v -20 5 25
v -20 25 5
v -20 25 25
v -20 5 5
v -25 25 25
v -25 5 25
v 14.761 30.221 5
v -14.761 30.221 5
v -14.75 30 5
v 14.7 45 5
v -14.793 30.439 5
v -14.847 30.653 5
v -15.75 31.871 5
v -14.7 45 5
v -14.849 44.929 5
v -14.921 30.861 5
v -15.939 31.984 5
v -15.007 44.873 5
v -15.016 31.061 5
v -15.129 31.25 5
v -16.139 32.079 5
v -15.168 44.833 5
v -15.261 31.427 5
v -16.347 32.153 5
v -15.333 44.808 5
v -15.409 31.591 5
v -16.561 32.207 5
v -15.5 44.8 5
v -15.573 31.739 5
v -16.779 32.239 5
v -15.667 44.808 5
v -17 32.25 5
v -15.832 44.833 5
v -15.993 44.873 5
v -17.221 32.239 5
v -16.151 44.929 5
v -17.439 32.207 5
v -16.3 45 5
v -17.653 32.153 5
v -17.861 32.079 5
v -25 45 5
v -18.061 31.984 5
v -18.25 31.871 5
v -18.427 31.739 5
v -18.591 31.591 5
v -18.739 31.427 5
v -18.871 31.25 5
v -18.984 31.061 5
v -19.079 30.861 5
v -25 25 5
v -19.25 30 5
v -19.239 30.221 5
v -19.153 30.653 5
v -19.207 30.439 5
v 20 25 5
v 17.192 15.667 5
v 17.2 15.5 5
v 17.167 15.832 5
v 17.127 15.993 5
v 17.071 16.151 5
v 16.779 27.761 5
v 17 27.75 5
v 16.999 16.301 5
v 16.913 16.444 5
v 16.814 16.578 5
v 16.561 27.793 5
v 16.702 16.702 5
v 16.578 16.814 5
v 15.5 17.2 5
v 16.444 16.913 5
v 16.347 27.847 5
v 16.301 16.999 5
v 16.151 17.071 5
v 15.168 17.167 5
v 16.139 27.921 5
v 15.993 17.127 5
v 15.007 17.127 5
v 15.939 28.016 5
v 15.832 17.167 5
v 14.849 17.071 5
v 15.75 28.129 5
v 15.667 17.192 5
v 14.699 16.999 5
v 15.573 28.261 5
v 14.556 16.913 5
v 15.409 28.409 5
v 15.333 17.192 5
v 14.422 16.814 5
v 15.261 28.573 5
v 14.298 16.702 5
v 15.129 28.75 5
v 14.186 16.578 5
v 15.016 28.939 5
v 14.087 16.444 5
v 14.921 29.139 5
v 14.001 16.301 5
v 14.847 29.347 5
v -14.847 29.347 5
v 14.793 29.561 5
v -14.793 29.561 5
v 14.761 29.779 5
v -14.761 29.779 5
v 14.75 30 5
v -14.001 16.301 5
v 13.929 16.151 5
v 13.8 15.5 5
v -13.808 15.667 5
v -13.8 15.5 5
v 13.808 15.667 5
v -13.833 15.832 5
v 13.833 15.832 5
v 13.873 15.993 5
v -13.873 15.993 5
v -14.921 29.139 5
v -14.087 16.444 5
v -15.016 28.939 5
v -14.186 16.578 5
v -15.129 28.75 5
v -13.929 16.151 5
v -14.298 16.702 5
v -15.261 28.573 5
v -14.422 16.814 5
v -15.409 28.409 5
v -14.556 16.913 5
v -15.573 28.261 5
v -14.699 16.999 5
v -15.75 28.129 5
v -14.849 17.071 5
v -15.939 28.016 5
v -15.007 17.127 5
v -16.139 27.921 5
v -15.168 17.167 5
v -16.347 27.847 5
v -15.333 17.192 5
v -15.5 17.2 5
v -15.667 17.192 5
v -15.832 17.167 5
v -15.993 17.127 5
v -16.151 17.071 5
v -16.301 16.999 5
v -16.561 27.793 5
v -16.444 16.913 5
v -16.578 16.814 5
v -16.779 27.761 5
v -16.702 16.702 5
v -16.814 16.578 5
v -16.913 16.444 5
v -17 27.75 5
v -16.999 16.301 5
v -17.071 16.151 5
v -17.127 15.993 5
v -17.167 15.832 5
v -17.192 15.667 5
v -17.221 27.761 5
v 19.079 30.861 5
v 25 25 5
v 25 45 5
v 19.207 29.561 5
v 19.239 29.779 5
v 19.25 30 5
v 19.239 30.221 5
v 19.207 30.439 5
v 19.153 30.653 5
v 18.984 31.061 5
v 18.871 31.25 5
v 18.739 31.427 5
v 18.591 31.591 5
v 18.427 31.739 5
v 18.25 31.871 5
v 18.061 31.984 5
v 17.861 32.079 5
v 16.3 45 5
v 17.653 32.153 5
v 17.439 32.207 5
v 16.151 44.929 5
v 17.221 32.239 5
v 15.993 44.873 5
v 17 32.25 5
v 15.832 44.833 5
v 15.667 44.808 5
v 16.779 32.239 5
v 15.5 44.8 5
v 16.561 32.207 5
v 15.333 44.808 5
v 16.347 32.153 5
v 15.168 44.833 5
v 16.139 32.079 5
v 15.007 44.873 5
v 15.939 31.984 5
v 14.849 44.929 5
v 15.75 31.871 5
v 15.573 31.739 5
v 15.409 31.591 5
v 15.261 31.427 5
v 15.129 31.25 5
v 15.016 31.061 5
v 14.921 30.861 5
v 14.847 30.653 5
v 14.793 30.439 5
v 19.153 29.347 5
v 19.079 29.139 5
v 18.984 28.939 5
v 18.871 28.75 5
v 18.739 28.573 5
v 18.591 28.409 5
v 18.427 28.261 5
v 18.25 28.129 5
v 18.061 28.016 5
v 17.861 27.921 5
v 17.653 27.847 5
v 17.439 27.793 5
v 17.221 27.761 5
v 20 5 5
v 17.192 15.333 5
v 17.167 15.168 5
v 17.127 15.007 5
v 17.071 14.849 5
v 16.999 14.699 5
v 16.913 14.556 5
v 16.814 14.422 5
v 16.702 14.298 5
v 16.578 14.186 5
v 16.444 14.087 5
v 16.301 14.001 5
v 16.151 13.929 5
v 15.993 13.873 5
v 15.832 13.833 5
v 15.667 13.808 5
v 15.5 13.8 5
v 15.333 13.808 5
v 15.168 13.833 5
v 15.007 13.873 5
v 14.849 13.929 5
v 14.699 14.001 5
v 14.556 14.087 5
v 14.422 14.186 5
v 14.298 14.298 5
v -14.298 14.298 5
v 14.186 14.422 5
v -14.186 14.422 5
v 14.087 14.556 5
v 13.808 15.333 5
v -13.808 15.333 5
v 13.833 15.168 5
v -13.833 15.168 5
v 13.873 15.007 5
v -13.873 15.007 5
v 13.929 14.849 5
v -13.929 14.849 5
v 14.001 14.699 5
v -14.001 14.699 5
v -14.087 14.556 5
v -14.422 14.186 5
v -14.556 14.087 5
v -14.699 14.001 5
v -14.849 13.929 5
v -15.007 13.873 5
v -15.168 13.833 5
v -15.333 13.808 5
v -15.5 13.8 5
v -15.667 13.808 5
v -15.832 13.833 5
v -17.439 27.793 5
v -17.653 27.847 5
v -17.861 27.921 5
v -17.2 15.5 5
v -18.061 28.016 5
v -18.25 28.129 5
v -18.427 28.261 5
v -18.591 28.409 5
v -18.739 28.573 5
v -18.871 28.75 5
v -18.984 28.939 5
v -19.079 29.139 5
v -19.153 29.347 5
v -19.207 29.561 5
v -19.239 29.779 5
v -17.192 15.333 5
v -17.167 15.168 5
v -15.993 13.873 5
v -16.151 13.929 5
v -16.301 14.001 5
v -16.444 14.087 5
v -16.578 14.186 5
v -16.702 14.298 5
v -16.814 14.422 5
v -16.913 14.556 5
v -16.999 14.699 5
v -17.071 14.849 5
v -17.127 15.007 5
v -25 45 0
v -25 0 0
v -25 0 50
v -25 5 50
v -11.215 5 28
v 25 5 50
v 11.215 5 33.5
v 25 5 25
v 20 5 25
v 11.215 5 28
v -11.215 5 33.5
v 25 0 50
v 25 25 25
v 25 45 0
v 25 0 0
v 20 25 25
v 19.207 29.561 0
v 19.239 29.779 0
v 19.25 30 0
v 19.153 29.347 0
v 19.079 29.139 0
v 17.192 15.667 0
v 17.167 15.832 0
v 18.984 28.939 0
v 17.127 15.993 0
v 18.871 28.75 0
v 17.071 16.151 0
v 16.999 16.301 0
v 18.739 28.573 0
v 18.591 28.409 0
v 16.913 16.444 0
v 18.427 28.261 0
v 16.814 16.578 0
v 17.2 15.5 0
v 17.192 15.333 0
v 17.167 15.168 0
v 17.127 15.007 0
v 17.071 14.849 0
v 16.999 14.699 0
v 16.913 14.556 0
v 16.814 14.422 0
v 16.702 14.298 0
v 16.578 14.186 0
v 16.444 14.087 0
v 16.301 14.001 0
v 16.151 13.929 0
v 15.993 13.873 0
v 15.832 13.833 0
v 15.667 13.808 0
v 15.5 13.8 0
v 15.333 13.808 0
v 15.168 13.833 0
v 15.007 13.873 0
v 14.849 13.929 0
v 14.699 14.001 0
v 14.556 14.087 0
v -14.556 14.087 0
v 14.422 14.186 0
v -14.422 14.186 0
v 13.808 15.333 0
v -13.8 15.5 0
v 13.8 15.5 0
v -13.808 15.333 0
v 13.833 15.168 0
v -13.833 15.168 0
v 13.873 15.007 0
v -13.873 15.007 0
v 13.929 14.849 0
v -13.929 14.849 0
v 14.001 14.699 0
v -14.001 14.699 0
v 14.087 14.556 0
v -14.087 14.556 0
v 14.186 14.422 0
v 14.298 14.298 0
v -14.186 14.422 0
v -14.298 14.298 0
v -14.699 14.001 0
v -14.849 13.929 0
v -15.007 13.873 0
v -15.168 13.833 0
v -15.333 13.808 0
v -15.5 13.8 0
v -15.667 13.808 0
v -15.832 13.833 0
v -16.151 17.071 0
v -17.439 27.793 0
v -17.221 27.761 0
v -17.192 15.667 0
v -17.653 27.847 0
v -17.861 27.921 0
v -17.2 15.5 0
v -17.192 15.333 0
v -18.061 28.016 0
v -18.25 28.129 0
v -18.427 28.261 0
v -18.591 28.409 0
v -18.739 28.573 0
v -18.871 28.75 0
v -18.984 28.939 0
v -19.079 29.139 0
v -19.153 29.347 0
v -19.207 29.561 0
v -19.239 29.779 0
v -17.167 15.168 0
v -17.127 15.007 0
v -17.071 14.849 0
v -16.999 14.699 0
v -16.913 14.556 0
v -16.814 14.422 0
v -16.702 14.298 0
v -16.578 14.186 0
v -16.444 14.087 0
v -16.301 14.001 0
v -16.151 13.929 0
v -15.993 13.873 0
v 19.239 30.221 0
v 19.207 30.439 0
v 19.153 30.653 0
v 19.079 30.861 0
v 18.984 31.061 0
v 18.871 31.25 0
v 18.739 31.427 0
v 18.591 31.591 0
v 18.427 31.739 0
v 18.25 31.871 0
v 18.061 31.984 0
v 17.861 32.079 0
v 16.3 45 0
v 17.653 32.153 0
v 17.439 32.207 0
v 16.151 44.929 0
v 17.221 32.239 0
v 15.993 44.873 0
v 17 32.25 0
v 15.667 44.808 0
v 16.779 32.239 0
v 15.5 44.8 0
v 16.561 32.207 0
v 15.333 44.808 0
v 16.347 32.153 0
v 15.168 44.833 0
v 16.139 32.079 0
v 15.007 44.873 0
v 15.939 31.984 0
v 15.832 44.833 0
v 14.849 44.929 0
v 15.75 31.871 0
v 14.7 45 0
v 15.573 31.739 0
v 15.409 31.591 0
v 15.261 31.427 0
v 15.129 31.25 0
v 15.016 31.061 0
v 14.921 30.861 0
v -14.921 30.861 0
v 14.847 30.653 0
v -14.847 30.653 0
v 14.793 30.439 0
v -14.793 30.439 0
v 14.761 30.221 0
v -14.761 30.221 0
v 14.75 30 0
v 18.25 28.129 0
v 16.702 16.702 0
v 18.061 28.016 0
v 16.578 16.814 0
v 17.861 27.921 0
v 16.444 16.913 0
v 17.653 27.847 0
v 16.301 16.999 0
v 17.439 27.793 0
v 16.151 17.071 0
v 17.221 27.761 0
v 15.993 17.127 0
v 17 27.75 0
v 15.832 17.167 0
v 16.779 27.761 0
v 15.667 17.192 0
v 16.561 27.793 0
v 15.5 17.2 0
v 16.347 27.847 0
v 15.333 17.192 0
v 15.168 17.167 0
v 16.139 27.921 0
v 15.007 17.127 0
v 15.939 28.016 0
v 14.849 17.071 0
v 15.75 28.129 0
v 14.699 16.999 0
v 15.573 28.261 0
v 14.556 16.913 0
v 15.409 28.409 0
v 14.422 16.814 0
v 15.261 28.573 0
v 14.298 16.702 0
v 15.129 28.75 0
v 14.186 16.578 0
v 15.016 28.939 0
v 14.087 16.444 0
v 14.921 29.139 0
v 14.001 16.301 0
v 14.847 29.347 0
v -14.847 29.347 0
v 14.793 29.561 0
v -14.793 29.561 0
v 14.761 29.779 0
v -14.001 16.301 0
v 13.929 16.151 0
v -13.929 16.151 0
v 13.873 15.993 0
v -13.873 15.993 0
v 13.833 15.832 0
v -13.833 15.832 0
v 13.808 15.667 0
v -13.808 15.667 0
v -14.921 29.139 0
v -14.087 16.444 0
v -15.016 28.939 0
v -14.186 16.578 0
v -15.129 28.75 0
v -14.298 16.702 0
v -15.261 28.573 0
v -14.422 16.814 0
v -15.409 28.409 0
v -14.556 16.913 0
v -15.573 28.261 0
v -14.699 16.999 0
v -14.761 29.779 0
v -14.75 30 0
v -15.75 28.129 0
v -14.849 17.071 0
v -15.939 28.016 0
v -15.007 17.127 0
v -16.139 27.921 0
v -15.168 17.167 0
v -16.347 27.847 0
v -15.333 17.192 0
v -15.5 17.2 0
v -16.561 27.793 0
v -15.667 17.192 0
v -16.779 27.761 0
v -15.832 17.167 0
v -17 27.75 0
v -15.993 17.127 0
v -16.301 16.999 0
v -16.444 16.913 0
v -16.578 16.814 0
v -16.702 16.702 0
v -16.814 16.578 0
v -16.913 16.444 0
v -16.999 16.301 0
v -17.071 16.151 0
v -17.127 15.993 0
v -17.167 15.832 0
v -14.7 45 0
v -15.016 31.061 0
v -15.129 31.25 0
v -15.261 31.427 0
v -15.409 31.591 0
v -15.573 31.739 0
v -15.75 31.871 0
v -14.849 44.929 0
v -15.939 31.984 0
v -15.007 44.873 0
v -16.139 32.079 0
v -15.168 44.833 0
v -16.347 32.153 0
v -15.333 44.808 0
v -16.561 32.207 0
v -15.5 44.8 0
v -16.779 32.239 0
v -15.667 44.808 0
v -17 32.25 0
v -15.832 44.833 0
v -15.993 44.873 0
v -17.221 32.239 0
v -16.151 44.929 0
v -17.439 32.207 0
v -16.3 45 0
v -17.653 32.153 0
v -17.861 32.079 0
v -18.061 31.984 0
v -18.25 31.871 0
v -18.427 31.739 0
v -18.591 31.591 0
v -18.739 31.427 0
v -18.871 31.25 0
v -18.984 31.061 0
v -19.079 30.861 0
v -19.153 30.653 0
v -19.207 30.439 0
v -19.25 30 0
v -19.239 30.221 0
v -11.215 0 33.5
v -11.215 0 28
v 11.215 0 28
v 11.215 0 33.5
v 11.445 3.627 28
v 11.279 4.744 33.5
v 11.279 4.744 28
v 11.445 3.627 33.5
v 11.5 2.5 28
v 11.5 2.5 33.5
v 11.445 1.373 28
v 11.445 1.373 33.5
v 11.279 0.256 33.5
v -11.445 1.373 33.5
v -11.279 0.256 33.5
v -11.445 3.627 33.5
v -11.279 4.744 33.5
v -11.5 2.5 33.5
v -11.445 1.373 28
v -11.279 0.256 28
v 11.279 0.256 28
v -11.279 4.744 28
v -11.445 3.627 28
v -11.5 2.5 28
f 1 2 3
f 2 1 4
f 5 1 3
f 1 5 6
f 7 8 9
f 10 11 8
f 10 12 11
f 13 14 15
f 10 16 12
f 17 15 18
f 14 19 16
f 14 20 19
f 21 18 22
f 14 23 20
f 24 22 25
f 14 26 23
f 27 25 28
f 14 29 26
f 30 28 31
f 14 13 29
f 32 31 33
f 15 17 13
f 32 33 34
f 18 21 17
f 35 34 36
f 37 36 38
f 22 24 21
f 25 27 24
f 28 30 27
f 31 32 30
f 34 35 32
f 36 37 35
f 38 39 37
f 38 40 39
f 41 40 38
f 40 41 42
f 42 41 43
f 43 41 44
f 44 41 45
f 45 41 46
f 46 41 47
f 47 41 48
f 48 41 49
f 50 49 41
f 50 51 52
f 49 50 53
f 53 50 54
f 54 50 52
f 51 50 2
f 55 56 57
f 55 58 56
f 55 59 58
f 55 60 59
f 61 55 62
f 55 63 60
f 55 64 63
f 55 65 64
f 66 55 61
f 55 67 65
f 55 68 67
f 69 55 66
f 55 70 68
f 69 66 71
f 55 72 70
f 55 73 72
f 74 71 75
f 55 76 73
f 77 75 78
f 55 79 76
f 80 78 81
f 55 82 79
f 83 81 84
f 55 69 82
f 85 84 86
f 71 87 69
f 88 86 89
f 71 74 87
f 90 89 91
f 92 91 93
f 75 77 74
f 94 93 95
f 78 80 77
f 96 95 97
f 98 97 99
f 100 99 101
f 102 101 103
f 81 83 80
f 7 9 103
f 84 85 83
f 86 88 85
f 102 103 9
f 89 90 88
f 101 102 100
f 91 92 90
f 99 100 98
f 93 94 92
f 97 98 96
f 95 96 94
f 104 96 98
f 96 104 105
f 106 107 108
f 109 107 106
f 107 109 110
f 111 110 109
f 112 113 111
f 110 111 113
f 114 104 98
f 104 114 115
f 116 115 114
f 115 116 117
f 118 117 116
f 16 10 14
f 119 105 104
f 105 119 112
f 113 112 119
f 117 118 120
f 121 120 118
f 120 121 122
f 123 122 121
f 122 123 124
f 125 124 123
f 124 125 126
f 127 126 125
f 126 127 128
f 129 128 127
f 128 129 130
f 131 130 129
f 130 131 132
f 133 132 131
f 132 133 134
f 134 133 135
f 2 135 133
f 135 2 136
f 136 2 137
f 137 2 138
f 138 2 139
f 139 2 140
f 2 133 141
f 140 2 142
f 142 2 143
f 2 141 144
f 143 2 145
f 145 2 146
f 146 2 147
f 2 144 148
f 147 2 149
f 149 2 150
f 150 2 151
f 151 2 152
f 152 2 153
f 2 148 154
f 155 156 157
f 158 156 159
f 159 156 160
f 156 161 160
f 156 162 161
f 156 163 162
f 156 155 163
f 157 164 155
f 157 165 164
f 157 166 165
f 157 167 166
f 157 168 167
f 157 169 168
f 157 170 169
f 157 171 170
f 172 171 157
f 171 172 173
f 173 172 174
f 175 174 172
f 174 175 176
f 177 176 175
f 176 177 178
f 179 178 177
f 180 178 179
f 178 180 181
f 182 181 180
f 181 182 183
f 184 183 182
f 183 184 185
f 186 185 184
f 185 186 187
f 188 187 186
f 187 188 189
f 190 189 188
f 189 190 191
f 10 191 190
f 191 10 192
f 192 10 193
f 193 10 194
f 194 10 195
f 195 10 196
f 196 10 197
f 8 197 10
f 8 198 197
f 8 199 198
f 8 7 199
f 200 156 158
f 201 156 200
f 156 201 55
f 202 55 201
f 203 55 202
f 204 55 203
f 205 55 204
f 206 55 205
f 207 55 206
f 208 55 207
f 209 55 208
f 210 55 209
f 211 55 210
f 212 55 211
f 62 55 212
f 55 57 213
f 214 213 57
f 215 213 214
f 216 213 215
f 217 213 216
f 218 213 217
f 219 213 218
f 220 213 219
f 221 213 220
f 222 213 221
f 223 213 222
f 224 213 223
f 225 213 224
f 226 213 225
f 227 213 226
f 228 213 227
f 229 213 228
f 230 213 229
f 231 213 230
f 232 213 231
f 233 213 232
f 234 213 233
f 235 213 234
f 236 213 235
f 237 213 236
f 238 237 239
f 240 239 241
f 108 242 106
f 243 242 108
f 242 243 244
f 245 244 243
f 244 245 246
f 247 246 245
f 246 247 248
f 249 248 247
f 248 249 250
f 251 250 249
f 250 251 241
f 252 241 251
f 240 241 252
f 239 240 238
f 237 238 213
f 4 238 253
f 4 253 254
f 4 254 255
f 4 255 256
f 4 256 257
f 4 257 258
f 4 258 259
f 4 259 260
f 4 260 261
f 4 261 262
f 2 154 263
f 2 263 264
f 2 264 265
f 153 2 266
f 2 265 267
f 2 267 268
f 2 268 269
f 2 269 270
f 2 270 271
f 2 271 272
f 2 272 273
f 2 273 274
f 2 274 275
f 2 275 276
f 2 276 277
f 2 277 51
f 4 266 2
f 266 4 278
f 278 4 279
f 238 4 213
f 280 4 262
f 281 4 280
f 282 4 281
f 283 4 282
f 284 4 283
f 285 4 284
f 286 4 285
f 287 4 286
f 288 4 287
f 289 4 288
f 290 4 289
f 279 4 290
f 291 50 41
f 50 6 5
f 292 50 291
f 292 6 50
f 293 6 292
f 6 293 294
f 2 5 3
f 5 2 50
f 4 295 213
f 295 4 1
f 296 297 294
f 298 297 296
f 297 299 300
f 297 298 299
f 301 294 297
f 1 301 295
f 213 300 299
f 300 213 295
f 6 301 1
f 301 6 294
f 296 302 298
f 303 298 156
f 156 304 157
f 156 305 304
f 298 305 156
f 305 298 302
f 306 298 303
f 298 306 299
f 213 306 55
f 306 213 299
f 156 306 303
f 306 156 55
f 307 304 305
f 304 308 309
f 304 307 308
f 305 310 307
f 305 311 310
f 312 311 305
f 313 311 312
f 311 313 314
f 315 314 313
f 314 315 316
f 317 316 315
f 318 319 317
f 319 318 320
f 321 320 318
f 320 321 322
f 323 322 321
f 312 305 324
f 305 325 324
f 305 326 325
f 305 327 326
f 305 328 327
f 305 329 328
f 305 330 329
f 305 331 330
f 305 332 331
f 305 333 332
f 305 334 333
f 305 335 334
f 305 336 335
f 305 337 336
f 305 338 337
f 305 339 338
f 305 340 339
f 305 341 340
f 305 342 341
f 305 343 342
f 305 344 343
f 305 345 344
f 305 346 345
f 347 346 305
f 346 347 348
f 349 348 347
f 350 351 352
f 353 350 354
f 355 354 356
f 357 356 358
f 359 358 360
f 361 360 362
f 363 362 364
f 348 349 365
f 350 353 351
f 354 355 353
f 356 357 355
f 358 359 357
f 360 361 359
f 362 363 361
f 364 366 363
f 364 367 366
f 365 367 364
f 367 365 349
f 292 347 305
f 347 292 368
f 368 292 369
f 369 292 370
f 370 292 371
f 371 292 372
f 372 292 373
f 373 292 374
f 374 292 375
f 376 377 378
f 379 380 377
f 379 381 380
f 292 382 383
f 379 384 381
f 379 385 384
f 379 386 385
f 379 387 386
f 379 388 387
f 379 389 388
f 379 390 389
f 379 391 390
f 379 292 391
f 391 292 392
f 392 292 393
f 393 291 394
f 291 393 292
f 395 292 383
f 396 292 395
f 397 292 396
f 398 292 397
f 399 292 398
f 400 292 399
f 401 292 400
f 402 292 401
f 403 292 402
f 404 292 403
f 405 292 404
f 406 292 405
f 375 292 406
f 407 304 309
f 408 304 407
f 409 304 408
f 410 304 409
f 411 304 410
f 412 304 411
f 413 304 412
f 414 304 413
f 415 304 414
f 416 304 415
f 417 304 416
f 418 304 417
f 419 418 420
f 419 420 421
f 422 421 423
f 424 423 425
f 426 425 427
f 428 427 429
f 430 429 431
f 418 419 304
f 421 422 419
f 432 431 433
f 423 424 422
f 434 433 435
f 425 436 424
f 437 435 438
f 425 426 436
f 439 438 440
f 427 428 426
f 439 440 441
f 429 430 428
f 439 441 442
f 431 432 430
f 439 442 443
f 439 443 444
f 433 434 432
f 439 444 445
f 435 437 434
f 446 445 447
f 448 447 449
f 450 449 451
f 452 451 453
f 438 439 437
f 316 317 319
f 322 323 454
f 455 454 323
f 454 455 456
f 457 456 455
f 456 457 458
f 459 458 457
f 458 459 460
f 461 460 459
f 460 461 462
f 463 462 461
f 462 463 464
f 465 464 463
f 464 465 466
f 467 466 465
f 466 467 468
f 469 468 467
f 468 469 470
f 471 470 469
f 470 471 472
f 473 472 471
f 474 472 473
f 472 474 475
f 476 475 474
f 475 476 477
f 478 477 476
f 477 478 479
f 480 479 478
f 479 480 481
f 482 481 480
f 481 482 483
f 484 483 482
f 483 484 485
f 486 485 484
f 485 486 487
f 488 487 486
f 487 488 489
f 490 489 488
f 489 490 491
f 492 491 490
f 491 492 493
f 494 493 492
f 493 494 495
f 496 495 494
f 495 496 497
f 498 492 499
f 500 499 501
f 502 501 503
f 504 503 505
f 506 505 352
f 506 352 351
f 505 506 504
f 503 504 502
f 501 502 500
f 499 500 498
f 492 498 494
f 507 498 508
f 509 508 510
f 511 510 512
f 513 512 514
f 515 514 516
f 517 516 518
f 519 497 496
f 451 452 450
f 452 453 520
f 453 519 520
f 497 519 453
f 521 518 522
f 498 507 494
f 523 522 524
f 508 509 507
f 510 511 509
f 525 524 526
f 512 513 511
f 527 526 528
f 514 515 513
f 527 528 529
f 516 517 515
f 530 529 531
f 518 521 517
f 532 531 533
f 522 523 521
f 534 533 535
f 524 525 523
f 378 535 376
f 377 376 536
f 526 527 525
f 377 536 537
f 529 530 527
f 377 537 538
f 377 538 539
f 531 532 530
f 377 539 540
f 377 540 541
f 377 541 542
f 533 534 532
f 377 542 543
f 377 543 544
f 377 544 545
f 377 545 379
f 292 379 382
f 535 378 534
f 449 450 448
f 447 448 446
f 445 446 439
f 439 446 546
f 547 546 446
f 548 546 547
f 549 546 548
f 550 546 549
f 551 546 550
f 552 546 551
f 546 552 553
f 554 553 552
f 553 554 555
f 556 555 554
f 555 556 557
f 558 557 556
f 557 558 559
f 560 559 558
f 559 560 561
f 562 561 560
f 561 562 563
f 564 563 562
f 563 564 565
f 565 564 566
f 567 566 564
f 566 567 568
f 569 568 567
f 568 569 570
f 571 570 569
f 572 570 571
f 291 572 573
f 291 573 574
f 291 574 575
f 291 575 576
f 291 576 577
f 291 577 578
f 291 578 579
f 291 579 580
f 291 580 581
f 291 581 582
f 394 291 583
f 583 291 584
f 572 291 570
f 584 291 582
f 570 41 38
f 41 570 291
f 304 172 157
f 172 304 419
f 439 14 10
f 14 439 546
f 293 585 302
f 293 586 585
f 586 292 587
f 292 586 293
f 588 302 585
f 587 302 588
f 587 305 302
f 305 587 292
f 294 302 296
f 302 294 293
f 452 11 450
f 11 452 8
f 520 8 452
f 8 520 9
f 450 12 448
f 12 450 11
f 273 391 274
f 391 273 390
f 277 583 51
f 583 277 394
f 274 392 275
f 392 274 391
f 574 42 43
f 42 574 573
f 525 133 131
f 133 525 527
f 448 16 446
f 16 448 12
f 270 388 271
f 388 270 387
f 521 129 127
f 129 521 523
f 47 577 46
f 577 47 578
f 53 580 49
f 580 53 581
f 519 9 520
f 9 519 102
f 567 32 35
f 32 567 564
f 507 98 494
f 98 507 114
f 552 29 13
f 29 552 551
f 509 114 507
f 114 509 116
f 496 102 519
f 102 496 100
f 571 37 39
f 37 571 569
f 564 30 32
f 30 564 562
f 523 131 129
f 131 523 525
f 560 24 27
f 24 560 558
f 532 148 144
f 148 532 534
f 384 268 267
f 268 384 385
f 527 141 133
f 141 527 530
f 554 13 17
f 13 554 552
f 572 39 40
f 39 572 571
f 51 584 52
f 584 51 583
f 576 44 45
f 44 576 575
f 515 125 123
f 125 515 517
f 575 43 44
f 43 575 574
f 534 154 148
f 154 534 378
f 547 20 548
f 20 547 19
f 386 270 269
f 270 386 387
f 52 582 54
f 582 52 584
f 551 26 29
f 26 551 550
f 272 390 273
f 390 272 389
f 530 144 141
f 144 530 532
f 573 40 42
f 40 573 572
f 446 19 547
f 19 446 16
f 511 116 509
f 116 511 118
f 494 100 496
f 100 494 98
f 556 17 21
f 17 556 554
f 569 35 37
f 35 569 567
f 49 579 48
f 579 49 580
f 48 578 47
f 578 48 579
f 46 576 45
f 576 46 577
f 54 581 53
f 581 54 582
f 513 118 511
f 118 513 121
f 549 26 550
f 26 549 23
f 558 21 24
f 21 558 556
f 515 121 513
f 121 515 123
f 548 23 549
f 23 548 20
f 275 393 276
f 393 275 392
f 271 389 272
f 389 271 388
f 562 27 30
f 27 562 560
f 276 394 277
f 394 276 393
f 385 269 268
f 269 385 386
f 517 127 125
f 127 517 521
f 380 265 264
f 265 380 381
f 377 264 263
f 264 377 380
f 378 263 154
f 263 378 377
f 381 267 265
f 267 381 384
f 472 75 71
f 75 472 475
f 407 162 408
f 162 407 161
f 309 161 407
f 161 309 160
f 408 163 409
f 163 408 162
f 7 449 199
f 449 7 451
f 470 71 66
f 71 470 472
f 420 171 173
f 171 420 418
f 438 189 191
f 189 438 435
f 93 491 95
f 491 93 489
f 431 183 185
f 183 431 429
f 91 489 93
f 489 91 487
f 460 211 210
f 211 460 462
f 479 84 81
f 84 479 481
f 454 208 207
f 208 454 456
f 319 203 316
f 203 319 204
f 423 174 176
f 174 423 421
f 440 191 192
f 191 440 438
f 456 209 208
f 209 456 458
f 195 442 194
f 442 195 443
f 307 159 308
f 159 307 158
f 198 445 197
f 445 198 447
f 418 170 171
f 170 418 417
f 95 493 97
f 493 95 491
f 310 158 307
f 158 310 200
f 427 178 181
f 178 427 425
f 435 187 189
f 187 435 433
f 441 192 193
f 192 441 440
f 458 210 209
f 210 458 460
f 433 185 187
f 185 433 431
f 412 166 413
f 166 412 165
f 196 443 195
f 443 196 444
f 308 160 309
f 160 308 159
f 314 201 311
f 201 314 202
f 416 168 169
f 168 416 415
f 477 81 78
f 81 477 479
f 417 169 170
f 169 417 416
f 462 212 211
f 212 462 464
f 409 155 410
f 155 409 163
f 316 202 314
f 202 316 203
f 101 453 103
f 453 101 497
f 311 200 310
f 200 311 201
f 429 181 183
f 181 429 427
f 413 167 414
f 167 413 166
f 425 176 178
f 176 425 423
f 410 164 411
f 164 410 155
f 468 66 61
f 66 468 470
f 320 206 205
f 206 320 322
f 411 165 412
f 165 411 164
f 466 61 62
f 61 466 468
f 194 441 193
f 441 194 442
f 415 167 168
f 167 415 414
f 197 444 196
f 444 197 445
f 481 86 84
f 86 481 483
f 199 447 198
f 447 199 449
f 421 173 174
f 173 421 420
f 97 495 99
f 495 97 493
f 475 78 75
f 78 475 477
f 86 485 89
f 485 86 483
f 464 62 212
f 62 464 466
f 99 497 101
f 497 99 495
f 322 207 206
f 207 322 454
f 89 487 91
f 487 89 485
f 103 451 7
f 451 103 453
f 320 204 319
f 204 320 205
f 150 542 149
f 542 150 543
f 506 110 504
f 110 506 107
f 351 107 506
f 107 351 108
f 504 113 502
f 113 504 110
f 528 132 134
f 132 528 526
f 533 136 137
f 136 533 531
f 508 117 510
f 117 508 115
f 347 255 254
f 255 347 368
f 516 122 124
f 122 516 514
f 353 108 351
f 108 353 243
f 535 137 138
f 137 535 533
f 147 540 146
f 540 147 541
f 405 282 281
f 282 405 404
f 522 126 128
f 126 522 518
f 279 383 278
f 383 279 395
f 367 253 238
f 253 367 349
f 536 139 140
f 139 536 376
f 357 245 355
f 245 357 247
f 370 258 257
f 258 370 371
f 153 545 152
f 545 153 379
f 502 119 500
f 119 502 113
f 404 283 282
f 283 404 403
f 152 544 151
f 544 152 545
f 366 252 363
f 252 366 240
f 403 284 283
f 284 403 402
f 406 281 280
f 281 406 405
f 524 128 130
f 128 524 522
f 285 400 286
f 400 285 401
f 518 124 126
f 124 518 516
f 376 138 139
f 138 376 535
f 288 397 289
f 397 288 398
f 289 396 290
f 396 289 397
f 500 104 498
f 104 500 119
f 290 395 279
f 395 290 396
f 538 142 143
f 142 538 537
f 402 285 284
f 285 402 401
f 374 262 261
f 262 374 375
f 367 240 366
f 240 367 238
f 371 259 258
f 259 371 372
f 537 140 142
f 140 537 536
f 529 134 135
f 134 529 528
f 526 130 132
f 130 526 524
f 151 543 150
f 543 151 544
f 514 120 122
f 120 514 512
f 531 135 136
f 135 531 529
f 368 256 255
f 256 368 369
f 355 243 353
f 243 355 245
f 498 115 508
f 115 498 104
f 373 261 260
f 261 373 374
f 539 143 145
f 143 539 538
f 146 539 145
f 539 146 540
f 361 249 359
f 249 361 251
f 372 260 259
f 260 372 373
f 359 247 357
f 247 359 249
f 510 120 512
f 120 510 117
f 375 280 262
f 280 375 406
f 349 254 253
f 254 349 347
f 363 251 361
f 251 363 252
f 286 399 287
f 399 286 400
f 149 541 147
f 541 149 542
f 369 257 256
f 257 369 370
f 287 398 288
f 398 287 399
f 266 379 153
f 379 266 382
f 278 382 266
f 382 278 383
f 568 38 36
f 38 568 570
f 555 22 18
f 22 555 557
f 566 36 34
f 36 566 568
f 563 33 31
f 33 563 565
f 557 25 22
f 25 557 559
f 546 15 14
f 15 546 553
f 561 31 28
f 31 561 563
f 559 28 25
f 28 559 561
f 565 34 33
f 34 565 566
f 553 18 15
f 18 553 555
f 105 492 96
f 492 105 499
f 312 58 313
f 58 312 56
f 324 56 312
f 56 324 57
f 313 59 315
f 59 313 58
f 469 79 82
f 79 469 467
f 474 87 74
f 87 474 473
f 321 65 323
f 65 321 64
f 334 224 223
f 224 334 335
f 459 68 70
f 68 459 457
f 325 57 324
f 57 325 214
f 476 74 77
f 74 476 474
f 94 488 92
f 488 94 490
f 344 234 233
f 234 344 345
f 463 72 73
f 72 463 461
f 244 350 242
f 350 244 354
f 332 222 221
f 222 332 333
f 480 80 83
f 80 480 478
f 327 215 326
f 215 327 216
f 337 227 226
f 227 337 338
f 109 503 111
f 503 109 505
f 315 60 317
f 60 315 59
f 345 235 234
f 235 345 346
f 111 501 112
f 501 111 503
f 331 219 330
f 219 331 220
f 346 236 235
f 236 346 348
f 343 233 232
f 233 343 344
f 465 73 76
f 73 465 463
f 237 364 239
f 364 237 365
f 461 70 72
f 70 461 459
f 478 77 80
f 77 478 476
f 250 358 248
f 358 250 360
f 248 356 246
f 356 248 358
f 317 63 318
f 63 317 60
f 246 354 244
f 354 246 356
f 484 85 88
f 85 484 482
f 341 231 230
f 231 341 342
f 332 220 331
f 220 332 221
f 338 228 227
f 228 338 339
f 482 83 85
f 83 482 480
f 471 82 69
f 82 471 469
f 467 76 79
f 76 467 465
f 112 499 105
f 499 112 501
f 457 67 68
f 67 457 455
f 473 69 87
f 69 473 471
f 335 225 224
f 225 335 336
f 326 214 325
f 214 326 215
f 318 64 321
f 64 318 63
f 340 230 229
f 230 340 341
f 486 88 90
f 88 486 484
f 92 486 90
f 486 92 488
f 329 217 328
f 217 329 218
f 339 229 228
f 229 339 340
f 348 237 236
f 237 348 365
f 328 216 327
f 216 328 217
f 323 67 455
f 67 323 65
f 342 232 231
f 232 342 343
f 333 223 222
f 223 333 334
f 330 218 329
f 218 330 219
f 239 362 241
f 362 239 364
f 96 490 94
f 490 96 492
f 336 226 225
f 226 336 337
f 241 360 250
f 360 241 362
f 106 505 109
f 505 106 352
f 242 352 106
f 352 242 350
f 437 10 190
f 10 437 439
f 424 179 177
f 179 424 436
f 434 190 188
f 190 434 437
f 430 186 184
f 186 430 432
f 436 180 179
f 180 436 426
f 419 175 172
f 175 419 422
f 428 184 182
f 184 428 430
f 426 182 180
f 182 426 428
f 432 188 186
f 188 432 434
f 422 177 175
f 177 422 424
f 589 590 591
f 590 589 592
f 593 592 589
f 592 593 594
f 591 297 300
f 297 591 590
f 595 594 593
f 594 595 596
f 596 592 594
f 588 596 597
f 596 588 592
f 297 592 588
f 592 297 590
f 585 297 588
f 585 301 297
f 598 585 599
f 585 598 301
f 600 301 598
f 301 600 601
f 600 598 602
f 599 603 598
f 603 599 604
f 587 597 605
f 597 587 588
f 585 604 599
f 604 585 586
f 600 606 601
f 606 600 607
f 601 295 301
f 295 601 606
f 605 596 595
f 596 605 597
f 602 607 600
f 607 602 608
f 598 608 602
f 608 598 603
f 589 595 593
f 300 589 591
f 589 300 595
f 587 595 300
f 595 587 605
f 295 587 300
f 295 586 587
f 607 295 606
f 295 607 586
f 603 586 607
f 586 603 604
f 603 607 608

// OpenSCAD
// L-shaped mounting bracket for NEMA 17 stepper motor
// Print orientation: base plate on bed (z = 0), motor plate builds upward (+Z)
// Positioned per user coordinates (x -25..25, y 0..45), not centred

// ---------------- Parameters ----------------
plate_x      = 25;    // base plate length in X
plate_y      = 45;    // base plate length in Y
plate_t      = 5;     // base plate thickness (Z)

hole_m4_x    = 17;    // M4 hole offset from centre in X (+/-)
hole_m4_y    = 30;    // M4 hole position in Y
hole_m4_d    = 4.5;   // M4 hole diameter

motor_x      = 25;    // motor plate length in X
motor_y      = 5;     // motor plate thickness (Y)
motor_z      = 50;    // motor plate height (Z)

boss_d       = 23;    // motor centring boss hole diameter
boss_x       = 0;     // boss hole centre X
boss_z       = 28;    // boss hole centre Z

screw_d      = 3.4;   // M3 screw hole diameter
screw_pitch  = 31;    // square pattern side length for screws

gusset_t     = 5;     // gusset thickness (X)
gusset_leg   = 20;    // triangular gusset leg length (Y and Z)

eps          = 0.5;   // cutter overshoot past faces

$fn = 64;

// ---------------- Model ----------------
difference() {
    union() {
        // Base plate
        translate([-plate_x, 0, 0])
            cube([plate_x * 2, plate_y, plate_t]);

        // Motor plate on back edge
        translate([-motor_x, 0, 0])
            cube([motor_x * 2, motor_y, motor_z]);

        // Gussets, flush with left and right edges
        for (sx = [-1, 1])
            translate([sx > 0 ? motor_x - gusset_t : -motor_x,
                       motor_y, plate_t])
                cube([gusset_t, gusset_leg, gusset_leg]);
    }

    // M4 through-holes
    for (hx = [-hole_m4_x, hole_m4_x])
        translate([hx, hole_m4_y, -eps])
            cylinder(d = hole_m4_d, h = plate_t + motor_y + 2 * eps);

    // Boss hole for motor centring
    translate([boss_x, motor_y / 2, boss_z])
        cylinder(d = boss_d, h = motor_y + eps);

    // M3 screw holes on square pattern
    for (i = [0 : 3]) {
        for (j = [0 : 3]) {
            x = (i - 1.5) * screw_pitch;
            y = (j - 1.5) * screw_pitch;
            translate([x, y, -eps])
                cylinder(d = screw_d, h = plate_t + motor_y + 2 * eps);
        }
    }
}
